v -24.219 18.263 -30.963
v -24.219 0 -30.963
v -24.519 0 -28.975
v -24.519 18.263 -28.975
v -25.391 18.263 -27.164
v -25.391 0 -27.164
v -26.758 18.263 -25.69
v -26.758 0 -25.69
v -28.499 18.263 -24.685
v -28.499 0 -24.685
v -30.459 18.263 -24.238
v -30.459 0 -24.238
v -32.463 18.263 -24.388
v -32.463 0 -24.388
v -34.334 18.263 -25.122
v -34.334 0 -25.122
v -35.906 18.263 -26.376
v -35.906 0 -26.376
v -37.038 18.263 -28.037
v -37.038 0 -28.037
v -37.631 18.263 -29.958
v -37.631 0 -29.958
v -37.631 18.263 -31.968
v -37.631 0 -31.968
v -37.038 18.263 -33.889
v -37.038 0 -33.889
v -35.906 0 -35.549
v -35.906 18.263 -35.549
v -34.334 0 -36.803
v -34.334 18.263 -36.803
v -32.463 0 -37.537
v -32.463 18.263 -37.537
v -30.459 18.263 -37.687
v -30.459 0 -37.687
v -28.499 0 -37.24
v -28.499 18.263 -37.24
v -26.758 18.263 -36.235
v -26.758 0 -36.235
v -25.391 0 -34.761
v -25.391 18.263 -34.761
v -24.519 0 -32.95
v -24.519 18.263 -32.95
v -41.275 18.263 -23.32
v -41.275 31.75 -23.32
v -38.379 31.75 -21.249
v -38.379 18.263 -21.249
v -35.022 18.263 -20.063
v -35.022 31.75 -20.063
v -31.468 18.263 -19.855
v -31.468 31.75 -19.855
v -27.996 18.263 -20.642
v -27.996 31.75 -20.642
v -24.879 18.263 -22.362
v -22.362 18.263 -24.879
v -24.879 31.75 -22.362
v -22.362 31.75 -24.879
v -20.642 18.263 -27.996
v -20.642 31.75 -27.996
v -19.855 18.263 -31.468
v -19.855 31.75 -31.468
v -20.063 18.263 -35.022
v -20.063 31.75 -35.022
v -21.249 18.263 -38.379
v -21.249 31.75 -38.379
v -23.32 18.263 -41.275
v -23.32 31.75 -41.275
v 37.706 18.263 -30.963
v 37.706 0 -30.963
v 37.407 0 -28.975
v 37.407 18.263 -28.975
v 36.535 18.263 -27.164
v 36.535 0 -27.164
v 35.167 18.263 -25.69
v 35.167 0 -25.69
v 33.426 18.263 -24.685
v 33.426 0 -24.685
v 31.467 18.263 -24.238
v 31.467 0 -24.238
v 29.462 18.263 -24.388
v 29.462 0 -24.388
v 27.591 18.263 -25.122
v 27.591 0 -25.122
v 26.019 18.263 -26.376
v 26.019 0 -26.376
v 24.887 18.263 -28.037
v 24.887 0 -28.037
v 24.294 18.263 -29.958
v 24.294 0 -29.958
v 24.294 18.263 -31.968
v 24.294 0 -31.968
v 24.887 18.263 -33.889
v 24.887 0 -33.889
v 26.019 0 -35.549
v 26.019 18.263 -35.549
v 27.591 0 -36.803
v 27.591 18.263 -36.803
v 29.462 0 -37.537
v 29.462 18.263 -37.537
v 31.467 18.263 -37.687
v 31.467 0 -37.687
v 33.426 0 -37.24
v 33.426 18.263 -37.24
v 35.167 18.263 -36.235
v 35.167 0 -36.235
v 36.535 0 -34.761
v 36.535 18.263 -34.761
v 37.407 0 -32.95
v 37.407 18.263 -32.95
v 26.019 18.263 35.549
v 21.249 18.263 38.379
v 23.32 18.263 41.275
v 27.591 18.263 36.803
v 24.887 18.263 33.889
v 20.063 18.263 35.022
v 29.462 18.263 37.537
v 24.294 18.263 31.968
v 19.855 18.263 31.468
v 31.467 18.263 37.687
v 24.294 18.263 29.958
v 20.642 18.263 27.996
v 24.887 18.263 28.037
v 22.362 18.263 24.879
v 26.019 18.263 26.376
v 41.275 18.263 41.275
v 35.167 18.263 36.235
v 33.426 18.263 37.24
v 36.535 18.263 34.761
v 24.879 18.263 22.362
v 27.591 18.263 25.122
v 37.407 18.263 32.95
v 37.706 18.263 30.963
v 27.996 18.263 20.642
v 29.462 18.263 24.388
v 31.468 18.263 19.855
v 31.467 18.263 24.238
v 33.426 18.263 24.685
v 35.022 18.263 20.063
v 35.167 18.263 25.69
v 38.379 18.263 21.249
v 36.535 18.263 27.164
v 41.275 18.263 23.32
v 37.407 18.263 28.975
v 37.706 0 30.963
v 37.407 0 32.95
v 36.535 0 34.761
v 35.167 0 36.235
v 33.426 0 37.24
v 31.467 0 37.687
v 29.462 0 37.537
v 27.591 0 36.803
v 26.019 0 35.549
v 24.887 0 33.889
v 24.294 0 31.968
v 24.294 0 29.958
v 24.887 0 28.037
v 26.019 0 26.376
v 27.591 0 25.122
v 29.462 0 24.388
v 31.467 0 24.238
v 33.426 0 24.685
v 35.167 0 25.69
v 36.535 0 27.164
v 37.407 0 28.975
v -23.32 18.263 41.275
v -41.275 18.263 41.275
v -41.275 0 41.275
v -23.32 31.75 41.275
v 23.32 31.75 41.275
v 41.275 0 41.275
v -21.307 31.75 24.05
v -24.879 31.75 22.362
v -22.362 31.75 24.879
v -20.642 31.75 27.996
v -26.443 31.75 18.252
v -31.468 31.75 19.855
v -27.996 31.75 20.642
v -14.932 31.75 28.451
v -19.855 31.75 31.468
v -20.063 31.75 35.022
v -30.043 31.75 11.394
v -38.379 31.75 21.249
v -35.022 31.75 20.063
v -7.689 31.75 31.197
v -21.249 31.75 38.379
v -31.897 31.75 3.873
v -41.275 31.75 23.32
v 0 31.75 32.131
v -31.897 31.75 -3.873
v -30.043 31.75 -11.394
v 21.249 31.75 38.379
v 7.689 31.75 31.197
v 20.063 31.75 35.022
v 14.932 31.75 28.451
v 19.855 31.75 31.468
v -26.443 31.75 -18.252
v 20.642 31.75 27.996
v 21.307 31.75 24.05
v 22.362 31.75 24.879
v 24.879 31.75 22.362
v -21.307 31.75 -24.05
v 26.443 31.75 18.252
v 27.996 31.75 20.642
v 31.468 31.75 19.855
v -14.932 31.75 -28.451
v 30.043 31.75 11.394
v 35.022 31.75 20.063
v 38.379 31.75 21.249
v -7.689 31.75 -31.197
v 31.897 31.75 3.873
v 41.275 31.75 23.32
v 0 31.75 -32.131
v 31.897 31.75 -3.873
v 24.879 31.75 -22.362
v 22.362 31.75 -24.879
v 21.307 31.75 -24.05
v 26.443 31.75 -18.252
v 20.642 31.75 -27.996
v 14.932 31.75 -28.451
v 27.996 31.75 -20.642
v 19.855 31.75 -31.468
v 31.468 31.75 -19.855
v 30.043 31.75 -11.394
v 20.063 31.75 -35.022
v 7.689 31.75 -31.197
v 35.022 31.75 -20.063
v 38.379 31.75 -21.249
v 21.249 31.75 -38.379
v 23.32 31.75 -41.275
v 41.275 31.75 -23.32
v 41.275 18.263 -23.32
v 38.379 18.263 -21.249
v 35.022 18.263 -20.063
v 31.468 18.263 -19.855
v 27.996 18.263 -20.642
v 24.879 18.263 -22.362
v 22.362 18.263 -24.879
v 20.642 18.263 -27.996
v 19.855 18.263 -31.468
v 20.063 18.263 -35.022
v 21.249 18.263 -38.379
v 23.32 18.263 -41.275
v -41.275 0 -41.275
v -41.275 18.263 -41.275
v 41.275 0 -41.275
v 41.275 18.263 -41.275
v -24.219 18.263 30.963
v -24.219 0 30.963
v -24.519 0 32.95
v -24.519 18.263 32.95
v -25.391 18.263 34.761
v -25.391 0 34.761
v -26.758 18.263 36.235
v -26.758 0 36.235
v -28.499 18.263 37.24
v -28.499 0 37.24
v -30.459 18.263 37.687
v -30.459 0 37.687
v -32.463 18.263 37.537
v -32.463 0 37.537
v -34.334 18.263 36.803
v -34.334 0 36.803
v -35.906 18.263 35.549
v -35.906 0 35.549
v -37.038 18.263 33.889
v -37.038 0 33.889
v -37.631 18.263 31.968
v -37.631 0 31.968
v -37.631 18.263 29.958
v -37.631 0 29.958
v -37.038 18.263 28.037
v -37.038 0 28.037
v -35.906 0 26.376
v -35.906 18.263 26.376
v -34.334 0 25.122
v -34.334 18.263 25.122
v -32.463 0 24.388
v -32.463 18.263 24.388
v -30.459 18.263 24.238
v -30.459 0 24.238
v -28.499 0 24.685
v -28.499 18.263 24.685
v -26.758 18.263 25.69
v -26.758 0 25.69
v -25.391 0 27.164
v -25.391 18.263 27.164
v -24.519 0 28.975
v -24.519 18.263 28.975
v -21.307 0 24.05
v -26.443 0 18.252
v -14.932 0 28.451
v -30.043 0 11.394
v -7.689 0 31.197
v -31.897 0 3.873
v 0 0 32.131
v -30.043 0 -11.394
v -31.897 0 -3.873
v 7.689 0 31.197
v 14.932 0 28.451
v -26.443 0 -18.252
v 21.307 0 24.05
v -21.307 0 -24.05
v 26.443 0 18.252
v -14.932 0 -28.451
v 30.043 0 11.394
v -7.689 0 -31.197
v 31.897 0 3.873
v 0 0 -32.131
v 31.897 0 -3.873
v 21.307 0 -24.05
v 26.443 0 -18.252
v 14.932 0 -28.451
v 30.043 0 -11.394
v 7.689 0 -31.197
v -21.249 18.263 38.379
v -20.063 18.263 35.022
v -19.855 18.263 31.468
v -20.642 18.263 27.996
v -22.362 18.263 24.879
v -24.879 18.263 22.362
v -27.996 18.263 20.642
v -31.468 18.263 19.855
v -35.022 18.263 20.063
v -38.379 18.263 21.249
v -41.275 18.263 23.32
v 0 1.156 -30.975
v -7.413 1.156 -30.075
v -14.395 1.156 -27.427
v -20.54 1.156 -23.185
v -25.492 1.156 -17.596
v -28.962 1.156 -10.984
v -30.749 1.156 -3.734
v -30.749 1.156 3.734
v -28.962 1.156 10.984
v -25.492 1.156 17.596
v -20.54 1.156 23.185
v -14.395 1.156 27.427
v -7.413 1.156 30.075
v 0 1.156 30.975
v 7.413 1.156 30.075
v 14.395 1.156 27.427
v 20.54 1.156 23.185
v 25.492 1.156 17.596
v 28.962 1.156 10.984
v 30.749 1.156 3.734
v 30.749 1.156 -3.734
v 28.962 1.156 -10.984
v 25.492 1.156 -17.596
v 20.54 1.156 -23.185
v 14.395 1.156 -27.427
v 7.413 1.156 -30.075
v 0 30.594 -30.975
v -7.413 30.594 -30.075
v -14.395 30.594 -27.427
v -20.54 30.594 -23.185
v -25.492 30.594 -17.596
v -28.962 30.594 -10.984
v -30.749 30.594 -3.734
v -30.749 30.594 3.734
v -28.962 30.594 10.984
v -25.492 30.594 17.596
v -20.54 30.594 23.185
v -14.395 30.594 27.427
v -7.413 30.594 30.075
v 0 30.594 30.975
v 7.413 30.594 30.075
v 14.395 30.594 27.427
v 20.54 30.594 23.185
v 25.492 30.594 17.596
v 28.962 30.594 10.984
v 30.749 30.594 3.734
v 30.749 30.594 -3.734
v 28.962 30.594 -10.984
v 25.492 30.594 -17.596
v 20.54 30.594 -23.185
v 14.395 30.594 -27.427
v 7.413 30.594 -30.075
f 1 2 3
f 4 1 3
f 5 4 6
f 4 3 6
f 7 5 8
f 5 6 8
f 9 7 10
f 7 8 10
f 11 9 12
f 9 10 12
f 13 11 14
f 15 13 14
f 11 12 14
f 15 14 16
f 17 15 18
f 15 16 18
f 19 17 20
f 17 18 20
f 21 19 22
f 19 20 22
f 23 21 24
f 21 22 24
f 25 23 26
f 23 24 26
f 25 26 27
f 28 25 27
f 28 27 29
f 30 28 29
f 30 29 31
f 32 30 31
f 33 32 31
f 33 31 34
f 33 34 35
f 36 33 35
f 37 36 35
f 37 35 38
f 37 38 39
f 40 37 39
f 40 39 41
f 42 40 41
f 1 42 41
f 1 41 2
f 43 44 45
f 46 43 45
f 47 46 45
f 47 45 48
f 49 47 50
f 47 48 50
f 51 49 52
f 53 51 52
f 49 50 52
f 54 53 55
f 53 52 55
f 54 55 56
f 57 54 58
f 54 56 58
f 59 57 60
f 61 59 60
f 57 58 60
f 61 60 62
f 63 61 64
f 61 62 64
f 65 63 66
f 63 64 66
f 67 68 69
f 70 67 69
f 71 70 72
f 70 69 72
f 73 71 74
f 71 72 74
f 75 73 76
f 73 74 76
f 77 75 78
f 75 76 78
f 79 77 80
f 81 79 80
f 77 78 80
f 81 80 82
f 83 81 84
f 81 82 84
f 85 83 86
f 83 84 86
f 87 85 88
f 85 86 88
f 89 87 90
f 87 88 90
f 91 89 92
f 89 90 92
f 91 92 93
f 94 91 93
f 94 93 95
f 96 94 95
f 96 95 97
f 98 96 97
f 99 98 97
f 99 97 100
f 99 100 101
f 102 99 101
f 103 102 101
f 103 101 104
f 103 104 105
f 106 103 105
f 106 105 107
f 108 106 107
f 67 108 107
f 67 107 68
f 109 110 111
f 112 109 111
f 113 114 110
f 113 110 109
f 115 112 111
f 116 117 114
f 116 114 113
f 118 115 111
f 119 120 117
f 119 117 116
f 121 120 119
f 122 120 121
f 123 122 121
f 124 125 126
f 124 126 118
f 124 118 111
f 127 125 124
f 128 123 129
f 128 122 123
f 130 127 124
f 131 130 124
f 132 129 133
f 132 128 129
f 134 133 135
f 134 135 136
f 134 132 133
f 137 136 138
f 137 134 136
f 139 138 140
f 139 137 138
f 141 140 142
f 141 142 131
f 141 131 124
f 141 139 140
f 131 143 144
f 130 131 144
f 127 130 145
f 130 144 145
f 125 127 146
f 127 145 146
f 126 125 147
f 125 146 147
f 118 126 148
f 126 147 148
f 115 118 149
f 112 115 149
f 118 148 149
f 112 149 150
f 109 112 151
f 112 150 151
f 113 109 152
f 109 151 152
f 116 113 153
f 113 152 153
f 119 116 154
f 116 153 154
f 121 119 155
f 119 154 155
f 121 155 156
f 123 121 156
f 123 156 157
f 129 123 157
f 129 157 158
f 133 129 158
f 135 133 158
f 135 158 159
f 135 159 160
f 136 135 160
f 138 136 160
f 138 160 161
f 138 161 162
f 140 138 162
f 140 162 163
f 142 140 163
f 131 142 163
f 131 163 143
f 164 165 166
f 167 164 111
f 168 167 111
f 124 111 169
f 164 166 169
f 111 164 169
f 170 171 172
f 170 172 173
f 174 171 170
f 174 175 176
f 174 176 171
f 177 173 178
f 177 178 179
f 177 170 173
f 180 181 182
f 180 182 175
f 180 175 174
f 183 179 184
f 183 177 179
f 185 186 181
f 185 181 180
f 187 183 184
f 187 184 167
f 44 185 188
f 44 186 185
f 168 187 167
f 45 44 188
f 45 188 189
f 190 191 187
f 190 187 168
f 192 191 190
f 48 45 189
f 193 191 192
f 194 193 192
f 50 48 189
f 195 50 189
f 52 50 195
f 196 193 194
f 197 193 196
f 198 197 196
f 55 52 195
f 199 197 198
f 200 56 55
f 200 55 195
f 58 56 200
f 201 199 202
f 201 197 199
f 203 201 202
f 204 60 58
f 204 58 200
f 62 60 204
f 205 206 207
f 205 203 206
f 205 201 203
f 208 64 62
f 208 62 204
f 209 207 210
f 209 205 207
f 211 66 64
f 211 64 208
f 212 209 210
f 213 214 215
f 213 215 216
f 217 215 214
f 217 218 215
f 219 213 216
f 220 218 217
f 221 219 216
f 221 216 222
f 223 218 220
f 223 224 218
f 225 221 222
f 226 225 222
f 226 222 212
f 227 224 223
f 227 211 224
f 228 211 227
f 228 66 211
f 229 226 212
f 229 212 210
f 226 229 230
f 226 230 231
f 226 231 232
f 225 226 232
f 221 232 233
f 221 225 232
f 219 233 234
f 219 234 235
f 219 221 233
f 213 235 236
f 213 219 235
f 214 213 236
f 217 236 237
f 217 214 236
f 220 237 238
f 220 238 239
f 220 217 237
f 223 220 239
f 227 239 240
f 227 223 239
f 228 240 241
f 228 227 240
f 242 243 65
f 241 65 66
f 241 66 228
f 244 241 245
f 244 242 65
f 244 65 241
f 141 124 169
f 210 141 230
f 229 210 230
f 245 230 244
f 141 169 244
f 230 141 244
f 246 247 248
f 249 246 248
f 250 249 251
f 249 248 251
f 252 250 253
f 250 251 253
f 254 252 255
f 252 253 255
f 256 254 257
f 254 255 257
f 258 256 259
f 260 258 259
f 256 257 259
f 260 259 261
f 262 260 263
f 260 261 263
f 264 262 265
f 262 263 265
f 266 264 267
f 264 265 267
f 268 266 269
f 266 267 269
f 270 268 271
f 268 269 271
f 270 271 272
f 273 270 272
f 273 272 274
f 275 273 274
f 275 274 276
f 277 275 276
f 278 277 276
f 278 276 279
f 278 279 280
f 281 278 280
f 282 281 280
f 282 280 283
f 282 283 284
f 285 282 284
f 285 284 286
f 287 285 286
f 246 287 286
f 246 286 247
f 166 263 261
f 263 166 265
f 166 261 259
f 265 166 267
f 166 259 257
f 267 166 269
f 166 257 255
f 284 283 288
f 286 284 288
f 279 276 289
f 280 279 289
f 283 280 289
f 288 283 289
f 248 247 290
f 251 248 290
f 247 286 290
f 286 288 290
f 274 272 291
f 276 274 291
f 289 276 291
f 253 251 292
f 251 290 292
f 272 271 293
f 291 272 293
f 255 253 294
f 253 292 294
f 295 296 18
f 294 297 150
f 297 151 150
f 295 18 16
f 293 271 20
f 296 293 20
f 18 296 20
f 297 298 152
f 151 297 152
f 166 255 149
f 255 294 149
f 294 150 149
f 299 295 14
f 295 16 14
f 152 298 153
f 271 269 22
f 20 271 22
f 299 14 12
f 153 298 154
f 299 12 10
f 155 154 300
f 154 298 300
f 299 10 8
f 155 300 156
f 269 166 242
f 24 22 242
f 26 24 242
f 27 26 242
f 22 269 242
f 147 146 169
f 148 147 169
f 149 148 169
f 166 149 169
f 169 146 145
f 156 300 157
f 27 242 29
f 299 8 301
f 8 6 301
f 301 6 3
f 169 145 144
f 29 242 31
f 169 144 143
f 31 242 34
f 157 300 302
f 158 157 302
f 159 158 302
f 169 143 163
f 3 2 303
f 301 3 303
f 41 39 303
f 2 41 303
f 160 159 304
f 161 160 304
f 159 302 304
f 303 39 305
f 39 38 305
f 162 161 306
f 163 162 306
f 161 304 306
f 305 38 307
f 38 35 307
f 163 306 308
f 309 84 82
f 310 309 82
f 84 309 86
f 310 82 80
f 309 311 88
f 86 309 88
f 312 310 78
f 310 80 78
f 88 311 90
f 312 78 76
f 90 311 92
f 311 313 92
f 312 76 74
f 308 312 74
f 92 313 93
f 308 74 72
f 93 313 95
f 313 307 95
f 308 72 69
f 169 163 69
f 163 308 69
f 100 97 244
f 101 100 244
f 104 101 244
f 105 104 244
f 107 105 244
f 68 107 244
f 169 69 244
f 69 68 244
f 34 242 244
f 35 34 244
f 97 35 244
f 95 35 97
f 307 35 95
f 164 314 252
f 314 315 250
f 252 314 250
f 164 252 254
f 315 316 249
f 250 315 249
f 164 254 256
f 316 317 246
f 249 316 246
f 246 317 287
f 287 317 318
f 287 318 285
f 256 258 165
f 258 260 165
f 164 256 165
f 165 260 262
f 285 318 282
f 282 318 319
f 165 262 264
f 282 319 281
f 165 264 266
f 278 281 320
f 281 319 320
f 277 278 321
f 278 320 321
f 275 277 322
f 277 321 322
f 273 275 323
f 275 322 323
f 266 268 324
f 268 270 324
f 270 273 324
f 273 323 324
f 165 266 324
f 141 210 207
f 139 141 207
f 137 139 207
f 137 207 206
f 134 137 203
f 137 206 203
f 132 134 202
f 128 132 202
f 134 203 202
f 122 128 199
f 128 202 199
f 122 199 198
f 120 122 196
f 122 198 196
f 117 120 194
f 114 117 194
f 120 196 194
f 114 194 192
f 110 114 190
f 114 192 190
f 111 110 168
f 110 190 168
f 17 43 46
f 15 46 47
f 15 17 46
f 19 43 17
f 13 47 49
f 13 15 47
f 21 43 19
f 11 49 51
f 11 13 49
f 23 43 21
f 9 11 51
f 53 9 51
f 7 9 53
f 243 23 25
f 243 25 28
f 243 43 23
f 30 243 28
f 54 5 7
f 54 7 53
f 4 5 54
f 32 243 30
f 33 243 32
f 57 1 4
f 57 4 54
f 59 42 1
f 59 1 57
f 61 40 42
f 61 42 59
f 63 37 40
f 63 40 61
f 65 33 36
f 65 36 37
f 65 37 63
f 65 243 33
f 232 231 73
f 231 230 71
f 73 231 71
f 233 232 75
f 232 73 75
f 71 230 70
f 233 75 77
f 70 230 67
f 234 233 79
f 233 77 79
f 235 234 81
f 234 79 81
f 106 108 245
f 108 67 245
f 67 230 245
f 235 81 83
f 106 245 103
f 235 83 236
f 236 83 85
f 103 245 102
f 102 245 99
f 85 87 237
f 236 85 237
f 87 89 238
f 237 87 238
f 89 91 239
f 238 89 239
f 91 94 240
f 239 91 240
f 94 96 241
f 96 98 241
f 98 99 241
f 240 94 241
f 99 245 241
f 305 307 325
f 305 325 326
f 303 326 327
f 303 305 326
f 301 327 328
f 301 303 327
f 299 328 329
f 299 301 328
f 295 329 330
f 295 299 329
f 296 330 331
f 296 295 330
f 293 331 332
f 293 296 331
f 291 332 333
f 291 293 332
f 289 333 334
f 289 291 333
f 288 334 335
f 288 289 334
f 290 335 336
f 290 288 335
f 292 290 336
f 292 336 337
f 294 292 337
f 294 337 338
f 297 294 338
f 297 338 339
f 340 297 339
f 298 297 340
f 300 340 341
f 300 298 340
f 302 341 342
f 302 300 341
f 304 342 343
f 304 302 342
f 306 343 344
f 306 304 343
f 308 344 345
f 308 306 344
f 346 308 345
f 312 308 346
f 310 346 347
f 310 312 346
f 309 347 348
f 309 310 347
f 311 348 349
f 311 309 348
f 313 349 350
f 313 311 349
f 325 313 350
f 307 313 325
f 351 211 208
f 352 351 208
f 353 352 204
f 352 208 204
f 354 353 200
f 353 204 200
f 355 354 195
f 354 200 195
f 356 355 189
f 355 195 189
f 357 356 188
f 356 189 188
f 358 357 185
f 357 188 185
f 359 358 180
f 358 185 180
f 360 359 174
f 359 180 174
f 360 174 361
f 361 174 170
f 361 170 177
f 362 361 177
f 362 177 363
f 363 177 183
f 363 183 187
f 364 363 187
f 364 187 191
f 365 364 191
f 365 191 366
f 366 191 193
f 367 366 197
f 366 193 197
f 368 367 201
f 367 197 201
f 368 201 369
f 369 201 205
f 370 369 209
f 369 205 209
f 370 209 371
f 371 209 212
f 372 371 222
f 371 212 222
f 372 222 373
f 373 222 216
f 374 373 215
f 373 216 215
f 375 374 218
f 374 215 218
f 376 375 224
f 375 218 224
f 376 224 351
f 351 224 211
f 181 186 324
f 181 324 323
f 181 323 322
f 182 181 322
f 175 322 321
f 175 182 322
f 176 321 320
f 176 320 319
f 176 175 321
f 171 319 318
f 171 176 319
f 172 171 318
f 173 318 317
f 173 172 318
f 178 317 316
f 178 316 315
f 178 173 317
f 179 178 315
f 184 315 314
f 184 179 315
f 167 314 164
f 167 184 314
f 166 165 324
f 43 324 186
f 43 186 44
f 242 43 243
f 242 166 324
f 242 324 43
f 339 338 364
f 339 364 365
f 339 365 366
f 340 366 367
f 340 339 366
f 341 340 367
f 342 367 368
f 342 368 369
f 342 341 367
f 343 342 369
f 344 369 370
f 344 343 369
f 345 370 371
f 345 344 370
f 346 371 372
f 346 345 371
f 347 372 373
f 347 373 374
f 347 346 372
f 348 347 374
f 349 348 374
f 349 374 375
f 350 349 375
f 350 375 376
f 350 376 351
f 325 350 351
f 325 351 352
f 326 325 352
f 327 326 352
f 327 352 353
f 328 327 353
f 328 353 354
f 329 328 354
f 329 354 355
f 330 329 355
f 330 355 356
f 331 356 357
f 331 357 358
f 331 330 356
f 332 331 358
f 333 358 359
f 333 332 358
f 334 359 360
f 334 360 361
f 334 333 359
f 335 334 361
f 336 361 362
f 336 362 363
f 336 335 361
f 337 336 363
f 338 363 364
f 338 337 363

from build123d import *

# Parameters (mm, degrees)
SKETCH1_W          = 82.55
SKETCH1_H          = 82.55
SKETCH1_R          = 30.9753
EXTRUDE1_DEPTH     = 31.75
CUT_EXTRUDE1_DEPTH = 13.4874
HOLE1_D            = 13.4874
HOLE1_DEPTH        = 18.2626


with BuildPart() as part:
    # Sketch1 → Extrude1 (new body)
    with BuildSketch(Plane(origin=(0, 0, 0), x_dir=(1, 0, 0), z_dir=(0, 1, 0))):
        Rectangle(SKETCH1_W, SKETCH1_H)
        with Locations(Location((0, 0, 0), (0, 0, 270))):  # turned: the seam where the file's is
            Circle(SKETCH1_R, mode=Mode.SUBTRACT)
    extrude(amount=EXTRUDE1_DEPTH)

    # Sketch2 → Cut-Extrude1 (cut)
    with BuildSketch(Plane(origin=(0, 31.75, 0), x_dir=(1, 0, 0), z_dir=(0, 1, 0))):
        with BuildLine():
            Line((23.319621037, -41.275), (41.275, -41.275))
            Line((41.275, -41.275), (41.275, -23.319621037))
            ThreePointArc((41.275, -23.319621037), (23.531743879, -23.531743879), (23.319621037, -41.275))
        make_face()
        with BuildLine():
            Line((41.275, 41.275), (41.275, 23.319621037))
            ThreePointArc((41.275, 23.319621037), (23.531743879, 23.531743879), (23.319621037, 41.275))
            Line((23.319621037, 41.275), (41.275, 41.275))
        make_face()
        with BuildLine():
            Line((-23.319621037, 41.275), (-41.275, 41.275))
            Line((-41.275, 41.275), (-41.275, 23.319621037))
            ThreePointArc((-41.275, 23.319621037), (-23.531743879, 23.531743879), (-23.319621037, 41.275))
        make_face()
        with BuildLine():
            Line((-41.275, -41.275), (-41.275, -23.319621037))
            ThreePointArc((-41.275, -23.319621037), (-23.531743879, -23.531743879), (-23.319621037, -41.275))
            Line((-23.319621037, -41.275), (-41.275, -41.275))
        make_face()
    extrude(amount=-CUT_EXTRUDE1_DEPTH, mode=Mode.SUBTRACT)

    # Hole1
    with Locations(Plane(origin=(0, 18.2626, 0), x_dir=(-1, 0, 0), z_dir=(0, 1, 0))):
        with Locations((30.9626, 30.9626), (30.9626, -30.9626), (-30.9626, 30.9626), (-30.9626, -30.9626)):
            Hole(HOLE1_D / 2, depth=HOLE1_DEPTH)

    # Sketch5 → Cut-Revolve1 (revolve, cut)
    with BuildSketch(Plane(origin=(0, 0, 0), x_dir=(0, 0, -1), z_dir=(1, 0, 0)), mode=Mode.PRIVATE) as cut_revolve1_sk:
        Polygon((-32.131, 31.75), (-30.9753, 31.75), (-30.9753, 30.5943), align=None)
        Polygon((-30.9753, 1.1557), (-32.131, 0), (-30.9753, 0), align=None)
    revolve(cut_revolve1_sk.sketch.rotate(Axis((0, 0, 0), (0, 1, 0)), 180), axis=Axis((0, 0, 0), (0, 1, 0)), mode=Mode.SUBTRACT)  # turned: the seam where the file's is


solid = part.part
